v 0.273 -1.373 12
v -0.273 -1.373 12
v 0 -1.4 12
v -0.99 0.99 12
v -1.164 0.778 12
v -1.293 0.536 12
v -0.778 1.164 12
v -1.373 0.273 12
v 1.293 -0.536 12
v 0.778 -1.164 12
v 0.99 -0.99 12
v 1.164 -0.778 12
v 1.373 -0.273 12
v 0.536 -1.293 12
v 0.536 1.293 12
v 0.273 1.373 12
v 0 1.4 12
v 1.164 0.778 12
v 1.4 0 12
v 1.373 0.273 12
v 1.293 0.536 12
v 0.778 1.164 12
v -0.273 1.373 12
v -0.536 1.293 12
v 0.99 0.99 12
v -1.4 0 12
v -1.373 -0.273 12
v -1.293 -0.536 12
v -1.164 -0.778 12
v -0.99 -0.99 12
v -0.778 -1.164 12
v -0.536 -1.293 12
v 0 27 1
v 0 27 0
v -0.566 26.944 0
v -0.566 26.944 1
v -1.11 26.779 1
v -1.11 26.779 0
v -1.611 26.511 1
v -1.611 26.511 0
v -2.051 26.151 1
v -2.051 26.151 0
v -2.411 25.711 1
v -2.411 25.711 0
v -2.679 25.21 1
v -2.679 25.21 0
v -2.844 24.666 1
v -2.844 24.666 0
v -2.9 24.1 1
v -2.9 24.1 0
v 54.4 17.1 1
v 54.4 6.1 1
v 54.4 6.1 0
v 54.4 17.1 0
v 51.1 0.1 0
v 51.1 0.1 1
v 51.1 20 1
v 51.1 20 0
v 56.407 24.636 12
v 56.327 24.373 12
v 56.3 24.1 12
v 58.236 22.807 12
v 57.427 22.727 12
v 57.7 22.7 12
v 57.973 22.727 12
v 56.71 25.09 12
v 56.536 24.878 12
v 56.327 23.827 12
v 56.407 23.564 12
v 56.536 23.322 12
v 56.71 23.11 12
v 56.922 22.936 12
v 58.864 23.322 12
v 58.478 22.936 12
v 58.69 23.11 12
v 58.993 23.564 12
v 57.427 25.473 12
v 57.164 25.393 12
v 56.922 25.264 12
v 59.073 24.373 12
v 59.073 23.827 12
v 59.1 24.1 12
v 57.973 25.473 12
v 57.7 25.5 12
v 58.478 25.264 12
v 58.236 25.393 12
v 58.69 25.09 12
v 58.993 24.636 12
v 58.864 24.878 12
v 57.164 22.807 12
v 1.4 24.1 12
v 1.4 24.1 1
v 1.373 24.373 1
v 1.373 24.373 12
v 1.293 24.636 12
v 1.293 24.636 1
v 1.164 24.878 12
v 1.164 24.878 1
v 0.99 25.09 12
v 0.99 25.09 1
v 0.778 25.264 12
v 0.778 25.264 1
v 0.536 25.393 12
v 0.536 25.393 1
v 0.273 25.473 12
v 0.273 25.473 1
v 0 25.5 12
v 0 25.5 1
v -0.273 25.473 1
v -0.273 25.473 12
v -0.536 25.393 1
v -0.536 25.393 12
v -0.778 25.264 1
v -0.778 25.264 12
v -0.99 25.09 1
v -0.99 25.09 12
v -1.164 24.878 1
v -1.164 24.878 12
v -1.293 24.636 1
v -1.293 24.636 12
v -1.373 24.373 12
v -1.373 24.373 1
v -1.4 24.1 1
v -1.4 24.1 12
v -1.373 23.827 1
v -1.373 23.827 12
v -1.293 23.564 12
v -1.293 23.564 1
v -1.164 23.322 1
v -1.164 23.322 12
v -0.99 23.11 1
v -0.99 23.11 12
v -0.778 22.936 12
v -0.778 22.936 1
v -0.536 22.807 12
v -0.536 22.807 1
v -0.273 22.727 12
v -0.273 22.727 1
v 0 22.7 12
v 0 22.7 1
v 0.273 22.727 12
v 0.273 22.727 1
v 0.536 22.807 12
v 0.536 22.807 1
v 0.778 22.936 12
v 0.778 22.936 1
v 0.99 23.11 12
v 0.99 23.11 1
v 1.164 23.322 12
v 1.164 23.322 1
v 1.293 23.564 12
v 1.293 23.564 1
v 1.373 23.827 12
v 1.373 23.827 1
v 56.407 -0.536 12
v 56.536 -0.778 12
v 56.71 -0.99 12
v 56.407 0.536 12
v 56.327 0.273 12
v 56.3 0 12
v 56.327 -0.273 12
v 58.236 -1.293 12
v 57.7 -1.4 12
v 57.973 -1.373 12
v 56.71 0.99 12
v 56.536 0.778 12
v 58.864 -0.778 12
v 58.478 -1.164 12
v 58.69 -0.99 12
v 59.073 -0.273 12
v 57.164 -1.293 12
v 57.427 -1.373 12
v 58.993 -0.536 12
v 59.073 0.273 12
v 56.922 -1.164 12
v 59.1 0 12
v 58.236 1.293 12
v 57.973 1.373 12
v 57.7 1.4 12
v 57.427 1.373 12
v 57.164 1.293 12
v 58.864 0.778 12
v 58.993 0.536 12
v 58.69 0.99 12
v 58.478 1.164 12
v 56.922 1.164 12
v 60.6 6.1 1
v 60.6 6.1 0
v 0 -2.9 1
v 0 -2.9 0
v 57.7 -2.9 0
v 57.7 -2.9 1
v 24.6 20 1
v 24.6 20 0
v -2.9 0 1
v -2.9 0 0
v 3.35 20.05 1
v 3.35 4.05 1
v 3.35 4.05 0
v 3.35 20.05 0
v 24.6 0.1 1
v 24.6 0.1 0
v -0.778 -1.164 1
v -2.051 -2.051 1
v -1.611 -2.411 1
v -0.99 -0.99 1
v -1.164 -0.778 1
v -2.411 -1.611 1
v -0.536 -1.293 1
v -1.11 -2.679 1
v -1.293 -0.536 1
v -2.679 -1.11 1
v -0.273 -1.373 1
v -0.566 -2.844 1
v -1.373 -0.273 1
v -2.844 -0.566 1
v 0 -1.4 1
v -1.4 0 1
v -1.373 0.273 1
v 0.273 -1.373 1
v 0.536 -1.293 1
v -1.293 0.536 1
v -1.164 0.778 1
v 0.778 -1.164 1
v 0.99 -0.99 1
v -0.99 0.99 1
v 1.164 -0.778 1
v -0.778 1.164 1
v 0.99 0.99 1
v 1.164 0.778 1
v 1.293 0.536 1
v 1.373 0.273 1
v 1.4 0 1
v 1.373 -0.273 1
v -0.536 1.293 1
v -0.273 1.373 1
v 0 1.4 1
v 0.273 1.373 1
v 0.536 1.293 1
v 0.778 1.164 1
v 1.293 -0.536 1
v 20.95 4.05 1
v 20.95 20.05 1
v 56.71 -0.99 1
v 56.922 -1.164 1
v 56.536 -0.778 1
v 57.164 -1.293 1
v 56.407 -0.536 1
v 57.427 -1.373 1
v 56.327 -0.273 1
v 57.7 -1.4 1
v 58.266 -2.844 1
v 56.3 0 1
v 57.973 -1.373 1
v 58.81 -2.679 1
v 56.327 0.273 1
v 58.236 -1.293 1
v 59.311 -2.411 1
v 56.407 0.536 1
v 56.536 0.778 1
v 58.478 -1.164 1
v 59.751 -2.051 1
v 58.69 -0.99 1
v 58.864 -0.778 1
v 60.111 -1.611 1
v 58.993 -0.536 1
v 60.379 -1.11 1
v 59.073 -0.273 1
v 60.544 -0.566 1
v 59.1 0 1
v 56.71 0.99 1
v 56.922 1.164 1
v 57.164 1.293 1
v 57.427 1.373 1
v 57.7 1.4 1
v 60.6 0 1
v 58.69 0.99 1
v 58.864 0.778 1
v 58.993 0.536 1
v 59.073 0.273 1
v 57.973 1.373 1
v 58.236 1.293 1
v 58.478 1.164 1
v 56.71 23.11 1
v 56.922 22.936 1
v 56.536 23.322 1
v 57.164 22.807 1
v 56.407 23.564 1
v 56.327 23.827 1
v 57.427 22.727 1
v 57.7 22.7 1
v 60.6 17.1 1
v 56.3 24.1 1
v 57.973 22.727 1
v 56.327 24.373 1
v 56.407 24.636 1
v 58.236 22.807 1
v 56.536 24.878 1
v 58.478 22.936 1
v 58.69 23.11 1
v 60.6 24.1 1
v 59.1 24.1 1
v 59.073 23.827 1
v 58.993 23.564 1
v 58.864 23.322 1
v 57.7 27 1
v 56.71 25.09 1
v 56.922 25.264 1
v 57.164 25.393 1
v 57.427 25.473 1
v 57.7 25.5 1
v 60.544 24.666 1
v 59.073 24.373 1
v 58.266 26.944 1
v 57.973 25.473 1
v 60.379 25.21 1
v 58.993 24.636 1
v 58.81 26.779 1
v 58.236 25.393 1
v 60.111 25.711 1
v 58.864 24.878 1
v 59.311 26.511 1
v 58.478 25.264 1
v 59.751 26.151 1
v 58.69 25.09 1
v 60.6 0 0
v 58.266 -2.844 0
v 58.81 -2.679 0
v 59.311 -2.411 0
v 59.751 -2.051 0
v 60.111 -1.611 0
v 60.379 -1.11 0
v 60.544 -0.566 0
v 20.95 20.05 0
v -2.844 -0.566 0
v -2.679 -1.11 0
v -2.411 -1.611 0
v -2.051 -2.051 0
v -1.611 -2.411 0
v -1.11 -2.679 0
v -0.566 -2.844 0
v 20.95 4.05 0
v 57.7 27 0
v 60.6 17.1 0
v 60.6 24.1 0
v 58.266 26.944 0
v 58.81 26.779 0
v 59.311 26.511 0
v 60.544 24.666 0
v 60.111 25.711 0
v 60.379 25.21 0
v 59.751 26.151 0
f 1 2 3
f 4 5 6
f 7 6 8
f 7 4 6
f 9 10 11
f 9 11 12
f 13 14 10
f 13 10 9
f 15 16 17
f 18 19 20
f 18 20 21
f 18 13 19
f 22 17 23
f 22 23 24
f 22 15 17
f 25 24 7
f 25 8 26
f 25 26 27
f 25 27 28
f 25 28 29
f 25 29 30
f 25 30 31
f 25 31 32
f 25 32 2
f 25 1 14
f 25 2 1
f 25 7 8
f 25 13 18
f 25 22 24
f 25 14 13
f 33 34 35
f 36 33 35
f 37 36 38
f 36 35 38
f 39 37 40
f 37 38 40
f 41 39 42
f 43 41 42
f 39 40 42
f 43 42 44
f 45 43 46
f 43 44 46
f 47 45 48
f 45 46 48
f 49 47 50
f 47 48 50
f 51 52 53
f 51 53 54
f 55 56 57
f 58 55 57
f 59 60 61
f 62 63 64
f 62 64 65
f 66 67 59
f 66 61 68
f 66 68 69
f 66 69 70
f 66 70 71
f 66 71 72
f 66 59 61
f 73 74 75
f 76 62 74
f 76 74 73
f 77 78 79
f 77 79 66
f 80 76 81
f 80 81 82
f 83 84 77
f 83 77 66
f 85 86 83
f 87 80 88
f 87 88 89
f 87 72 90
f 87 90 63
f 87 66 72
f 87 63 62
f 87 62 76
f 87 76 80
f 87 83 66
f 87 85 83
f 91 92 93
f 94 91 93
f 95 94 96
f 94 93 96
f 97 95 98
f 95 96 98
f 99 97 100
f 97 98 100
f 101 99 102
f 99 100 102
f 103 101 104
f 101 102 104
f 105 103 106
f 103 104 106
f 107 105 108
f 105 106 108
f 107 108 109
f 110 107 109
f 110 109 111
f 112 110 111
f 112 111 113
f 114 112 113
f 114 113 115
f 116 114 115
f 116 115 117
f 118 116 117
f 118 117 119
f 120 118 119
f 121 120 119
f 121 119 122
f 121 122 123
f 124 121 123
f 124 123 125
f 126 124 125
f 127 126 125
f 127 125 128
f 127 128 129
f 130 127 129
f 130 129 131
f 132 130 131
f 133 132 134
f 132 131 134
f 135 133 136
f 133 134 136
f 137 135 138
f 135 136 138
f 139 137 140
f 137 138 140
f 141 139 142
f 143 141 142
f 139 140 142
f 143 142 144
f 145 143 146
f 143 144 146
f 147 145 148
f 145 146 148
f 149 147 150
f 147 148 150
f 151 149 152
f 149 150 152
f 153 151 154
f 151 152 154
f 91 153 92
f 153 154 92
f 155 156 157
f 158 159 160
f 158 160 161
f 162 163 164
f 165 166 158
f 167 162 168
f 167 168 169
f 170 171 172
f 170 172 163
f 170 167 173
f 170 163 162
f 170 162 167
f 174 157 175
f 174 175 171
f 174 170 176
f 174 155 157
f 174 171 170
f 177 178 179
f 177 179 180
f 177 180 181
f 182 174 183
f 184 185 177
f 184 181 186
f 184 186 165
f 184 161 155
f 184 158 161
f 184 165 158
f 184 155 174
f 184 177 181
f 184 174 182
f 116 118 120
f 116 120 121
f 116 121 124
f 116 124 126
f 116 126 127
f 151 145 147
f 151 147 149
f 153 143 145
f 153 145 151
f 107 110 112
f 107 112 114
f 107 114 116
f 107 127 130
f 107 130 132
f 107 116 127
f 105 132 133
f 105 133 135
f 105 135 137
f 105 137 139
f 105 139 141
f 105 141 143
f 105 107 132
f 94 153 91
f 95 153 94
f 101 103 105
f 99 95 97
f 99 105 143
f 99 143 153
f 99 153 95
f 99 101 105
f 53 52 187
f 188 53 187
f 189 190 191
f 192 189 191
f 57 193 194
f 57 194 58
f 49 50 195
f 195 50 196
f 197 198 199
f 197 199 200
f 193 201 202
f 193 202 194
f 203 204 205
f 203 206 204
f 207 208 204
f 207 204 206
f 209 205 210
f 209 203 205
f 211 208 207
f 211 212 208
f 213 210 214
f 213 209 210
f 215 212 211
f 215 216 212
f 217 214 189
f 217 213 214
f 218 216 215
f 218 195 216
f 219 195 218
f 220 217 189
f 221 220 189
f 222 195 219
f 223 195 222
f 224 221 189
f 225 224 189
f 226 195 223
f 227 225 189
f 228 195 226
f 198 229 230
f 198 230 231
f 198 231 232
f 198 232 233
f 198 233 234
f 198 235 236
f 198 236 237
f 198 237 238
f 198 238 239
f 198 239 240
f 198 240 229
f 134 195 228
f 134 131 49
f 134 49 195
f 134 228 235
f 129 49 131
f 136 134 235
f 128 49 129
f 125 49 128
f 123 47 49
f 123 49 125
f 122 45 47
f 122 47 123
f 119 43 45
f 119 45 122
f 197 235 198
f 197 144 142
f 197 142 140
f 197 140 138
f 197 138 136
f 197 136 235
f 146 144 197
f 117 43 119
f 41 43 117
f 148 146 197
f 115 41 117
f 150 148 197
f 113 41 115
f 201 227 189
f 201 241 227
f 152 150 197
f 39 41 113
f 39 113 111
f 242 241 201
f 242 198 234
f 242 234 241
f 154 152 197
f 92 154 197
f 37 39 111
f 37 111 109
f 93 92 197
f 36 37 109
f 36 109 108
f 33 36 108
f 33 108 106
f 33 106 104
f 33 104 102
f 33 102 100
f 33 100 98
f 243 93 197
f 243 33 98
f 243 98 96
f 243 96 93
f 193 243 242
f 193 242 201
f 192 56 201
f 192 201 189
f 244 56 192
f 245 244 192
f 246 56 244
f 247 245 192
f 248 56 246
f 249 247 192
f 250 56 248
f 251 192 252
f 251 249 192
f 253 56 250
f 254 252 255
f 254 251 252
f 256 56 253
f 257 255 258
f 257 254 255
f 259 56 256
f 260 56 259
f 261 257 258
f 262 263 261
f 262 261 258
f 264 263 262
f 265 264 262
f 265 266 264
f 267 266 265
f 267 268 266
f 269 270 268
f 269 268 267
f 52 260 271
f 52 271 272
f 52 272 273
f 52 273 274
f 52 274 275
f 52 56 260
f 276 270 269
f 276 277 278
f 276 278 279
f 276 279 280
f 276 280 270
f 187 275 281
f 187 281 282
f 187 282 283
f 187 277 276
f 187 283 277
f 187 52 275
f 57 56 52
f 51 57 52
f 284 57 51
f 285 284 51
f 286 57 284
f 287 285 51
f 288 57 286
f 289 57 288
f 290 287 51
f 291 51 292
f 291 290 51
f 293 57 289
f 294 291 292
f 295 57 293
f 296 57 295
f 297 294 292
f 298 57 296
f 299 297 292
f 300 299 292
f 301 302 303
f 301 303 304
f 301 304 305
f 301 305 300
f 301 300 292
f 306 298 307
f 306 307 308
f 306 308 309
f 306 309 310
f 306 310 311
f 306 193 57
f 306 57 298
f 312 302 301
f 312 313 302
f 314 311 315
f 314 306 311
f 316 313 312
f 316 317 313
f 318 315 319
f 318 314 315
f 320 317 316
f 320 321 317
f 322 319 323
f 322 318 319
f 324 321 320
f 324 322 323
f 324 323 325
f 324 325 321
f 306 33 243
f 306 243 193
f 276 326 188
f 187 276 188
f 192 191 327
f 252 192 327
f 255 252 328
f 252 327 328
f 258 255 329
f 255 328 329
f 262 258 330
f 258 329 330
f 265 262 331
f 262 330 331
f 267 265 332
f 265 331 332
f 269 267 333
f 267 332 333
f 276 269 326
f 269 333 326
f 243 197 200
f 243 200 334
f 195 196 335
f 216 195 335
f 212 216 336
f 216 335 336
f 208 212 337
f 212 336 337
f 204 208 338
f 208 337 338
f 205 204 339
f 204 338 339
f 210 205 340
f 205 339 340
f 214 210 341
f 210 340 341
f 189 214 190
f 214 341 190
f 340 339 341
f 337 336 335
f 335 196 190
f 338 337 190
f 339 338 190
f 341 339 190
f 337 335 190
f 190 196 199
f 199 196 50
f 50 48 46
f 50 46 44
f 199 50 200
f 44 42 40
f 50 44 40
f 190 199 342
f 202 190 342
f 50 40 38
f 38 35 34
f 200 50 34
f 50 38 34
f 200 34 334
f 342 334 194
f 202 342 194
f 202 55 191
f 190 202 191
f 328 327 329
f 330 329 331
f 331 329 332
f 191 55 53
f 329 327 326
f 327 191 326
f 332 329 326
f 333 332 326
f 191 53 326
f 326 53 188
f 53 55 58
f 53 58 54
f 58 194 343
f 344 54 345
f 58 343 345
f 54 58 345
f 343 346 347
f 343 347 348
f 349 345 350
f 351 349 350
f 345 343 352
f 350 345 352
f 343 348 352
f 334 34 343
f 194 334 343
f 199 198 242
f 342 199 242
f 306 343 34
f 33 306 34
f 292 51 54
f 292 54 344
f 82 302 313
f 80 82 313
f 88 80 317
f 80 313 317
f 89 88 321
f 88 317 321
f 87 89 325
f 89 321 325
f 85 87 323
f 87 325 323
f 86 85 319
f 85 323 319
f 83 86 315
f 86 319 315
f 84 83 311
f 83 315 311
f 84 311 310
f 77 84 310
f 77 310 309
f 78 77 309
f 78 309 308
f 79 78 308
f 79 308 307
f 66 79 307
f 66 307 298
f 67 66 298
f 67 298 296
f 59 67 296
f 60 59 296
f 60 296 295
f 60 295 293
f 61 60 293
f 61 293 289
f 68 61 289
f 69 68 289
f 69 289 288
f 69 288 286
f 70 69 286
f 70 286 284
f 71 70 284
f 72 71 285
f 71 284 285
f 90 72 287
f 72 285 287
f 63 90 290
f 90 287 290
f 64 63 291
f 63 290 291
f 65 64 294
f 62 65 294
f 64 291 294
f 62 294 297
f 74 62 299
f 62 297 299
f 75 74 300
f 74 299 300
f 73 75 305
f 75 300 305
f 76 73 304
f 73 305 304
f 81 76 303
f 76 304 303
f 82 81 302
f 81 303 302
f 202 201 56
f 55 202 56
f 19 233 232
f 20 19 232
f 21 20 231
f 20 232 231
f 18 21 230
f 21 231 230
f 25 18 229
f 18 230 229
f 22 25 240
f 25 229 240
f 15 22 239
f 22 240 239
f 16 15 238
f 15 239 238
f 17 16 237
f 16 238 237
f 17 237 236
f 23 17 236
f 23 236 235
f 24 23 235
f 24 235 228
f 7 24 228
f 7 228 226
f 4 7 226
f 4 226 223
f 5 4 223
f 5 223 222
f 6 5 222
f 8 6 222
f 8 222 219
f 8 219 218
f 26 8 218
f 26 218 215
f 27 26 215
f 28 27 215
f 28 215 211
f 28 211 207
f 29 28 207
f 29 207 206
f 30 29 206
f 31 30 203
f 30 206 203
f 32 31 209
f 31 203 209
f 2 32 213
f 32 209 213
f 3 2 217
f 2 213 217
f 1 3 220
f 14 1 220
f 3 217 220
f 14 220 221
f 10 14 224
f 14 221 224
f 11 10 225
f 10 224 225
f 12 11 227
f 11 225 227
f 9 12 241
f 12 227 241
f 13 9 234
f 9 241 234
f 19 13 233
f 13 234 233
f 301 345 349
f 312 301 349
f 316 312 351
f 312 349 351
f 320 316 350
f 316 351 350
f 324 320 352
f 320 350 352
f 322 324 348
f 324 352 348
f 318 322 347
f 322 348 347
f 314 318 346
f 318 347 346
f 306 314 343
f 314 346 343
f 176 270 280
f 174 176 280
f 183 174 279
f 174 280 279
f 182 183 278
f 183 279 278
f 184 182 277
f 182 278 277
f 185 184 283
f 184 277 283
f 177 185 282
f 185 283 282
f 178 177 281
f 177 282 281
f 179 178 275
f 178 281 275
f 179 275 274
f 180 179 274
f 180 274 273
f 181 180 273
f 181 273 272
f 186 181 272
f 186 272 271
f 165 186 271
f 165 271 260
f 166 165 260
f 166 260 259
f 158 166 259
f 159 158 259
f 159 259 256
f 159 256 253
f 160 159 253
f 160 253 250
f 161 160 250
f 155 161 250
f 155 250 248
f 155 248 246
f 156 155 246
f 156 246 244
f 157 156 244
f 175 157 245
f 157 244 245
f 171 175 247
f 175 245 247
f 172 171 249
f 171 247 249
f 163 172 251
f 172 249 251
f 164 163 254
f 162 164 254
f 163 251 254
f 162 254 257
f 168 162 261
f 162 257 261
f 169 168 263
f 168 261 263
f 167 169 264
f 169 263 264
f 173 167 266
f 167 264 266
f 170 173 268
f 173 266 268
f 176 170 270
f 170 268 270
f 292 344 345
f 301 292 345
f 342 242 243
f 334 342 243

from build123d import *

# Parameters (mm, degrees)
EXTRUDE_1_DEPTH     = 1
SKETCH_2_R          = 1.4
EXTRUDE_2_DEPTH     = 12
SKETCH_10_W         = 17.6
SKETCH_10_H         = 16
SKETCH_10_W_2       = 6.2
SKETCH_10_H_2       = 11
SKETCH_10_W_3       = 26.5
SKETCH_10_H_3       = 19.9
CUT_EXTRUDE_1_DEPTH = 2


with BuildPart() as part:
    # 草图1 → 凸台-拉伸1 (new body)
    with BuildSketch(Plane.XY):
        with BuildLine():
            Line((0, -2.9), (57.7, -2.9))
            ThreePointArc((57.7, -2.9), (59.750609665, -2.050609665), (60.6, 0))
            Line((60.6, 0), (60.6, 24.1))
            ThreePointArc((60.6, 24.1), (59.750609665, 26.150609665), (57.7, 27))
            Line((57.7, 27), (0, 27))
            ThreePointArc((0, 27), (-2.050609665, 26.150609665), (-2.9, 24.1))
            Line((-2.9, 24.1), (-2.9, 0))
            ThreePointArc((-2.9, 0), (-2.050609665, -2.050609665), (0, -2.9))
        make_face()
    extrude(amount=EXTRUDE_1_DEPTH)

    # 草图2 → 凸台-拉伸2 (add)
    with BuildSketch(Plane.XY):
        with Locations((0, 24.1)):
            Circle(SKETCH_2_R)
        Circle(SKETCH_2_R)
        with Locations((57.7, 0)):
            Circle(SKETCH_2_R)
        with Locations((57.7, 24.1)):
            Circle(SKETCH_2_R)
    extrude(amount=EXTRUDE_2_DEPTH)

    # 草图10 → 切除-拉伸1 (cut, through all)
    with BuildSketch(Plane.XY.offset(1)):
        with Locations((12.15, 12.05)):
            Rectangle(SKETCH_10_W, SKETCH_10_H)
        with Locations((57.5, 11.6)):
            Rectangle(SKETCH_10_W_2, SKETCH_10_H_2)
        with Locations((37.85, 10.05)):
            Rectangle(SKETCH_10_W_3, SKETCH_10_H_3)
    extrude(amount=-CUT_EXTRUDE_1_DEPTH, mode=Mode.SUBTRACT)


solid = part.part
